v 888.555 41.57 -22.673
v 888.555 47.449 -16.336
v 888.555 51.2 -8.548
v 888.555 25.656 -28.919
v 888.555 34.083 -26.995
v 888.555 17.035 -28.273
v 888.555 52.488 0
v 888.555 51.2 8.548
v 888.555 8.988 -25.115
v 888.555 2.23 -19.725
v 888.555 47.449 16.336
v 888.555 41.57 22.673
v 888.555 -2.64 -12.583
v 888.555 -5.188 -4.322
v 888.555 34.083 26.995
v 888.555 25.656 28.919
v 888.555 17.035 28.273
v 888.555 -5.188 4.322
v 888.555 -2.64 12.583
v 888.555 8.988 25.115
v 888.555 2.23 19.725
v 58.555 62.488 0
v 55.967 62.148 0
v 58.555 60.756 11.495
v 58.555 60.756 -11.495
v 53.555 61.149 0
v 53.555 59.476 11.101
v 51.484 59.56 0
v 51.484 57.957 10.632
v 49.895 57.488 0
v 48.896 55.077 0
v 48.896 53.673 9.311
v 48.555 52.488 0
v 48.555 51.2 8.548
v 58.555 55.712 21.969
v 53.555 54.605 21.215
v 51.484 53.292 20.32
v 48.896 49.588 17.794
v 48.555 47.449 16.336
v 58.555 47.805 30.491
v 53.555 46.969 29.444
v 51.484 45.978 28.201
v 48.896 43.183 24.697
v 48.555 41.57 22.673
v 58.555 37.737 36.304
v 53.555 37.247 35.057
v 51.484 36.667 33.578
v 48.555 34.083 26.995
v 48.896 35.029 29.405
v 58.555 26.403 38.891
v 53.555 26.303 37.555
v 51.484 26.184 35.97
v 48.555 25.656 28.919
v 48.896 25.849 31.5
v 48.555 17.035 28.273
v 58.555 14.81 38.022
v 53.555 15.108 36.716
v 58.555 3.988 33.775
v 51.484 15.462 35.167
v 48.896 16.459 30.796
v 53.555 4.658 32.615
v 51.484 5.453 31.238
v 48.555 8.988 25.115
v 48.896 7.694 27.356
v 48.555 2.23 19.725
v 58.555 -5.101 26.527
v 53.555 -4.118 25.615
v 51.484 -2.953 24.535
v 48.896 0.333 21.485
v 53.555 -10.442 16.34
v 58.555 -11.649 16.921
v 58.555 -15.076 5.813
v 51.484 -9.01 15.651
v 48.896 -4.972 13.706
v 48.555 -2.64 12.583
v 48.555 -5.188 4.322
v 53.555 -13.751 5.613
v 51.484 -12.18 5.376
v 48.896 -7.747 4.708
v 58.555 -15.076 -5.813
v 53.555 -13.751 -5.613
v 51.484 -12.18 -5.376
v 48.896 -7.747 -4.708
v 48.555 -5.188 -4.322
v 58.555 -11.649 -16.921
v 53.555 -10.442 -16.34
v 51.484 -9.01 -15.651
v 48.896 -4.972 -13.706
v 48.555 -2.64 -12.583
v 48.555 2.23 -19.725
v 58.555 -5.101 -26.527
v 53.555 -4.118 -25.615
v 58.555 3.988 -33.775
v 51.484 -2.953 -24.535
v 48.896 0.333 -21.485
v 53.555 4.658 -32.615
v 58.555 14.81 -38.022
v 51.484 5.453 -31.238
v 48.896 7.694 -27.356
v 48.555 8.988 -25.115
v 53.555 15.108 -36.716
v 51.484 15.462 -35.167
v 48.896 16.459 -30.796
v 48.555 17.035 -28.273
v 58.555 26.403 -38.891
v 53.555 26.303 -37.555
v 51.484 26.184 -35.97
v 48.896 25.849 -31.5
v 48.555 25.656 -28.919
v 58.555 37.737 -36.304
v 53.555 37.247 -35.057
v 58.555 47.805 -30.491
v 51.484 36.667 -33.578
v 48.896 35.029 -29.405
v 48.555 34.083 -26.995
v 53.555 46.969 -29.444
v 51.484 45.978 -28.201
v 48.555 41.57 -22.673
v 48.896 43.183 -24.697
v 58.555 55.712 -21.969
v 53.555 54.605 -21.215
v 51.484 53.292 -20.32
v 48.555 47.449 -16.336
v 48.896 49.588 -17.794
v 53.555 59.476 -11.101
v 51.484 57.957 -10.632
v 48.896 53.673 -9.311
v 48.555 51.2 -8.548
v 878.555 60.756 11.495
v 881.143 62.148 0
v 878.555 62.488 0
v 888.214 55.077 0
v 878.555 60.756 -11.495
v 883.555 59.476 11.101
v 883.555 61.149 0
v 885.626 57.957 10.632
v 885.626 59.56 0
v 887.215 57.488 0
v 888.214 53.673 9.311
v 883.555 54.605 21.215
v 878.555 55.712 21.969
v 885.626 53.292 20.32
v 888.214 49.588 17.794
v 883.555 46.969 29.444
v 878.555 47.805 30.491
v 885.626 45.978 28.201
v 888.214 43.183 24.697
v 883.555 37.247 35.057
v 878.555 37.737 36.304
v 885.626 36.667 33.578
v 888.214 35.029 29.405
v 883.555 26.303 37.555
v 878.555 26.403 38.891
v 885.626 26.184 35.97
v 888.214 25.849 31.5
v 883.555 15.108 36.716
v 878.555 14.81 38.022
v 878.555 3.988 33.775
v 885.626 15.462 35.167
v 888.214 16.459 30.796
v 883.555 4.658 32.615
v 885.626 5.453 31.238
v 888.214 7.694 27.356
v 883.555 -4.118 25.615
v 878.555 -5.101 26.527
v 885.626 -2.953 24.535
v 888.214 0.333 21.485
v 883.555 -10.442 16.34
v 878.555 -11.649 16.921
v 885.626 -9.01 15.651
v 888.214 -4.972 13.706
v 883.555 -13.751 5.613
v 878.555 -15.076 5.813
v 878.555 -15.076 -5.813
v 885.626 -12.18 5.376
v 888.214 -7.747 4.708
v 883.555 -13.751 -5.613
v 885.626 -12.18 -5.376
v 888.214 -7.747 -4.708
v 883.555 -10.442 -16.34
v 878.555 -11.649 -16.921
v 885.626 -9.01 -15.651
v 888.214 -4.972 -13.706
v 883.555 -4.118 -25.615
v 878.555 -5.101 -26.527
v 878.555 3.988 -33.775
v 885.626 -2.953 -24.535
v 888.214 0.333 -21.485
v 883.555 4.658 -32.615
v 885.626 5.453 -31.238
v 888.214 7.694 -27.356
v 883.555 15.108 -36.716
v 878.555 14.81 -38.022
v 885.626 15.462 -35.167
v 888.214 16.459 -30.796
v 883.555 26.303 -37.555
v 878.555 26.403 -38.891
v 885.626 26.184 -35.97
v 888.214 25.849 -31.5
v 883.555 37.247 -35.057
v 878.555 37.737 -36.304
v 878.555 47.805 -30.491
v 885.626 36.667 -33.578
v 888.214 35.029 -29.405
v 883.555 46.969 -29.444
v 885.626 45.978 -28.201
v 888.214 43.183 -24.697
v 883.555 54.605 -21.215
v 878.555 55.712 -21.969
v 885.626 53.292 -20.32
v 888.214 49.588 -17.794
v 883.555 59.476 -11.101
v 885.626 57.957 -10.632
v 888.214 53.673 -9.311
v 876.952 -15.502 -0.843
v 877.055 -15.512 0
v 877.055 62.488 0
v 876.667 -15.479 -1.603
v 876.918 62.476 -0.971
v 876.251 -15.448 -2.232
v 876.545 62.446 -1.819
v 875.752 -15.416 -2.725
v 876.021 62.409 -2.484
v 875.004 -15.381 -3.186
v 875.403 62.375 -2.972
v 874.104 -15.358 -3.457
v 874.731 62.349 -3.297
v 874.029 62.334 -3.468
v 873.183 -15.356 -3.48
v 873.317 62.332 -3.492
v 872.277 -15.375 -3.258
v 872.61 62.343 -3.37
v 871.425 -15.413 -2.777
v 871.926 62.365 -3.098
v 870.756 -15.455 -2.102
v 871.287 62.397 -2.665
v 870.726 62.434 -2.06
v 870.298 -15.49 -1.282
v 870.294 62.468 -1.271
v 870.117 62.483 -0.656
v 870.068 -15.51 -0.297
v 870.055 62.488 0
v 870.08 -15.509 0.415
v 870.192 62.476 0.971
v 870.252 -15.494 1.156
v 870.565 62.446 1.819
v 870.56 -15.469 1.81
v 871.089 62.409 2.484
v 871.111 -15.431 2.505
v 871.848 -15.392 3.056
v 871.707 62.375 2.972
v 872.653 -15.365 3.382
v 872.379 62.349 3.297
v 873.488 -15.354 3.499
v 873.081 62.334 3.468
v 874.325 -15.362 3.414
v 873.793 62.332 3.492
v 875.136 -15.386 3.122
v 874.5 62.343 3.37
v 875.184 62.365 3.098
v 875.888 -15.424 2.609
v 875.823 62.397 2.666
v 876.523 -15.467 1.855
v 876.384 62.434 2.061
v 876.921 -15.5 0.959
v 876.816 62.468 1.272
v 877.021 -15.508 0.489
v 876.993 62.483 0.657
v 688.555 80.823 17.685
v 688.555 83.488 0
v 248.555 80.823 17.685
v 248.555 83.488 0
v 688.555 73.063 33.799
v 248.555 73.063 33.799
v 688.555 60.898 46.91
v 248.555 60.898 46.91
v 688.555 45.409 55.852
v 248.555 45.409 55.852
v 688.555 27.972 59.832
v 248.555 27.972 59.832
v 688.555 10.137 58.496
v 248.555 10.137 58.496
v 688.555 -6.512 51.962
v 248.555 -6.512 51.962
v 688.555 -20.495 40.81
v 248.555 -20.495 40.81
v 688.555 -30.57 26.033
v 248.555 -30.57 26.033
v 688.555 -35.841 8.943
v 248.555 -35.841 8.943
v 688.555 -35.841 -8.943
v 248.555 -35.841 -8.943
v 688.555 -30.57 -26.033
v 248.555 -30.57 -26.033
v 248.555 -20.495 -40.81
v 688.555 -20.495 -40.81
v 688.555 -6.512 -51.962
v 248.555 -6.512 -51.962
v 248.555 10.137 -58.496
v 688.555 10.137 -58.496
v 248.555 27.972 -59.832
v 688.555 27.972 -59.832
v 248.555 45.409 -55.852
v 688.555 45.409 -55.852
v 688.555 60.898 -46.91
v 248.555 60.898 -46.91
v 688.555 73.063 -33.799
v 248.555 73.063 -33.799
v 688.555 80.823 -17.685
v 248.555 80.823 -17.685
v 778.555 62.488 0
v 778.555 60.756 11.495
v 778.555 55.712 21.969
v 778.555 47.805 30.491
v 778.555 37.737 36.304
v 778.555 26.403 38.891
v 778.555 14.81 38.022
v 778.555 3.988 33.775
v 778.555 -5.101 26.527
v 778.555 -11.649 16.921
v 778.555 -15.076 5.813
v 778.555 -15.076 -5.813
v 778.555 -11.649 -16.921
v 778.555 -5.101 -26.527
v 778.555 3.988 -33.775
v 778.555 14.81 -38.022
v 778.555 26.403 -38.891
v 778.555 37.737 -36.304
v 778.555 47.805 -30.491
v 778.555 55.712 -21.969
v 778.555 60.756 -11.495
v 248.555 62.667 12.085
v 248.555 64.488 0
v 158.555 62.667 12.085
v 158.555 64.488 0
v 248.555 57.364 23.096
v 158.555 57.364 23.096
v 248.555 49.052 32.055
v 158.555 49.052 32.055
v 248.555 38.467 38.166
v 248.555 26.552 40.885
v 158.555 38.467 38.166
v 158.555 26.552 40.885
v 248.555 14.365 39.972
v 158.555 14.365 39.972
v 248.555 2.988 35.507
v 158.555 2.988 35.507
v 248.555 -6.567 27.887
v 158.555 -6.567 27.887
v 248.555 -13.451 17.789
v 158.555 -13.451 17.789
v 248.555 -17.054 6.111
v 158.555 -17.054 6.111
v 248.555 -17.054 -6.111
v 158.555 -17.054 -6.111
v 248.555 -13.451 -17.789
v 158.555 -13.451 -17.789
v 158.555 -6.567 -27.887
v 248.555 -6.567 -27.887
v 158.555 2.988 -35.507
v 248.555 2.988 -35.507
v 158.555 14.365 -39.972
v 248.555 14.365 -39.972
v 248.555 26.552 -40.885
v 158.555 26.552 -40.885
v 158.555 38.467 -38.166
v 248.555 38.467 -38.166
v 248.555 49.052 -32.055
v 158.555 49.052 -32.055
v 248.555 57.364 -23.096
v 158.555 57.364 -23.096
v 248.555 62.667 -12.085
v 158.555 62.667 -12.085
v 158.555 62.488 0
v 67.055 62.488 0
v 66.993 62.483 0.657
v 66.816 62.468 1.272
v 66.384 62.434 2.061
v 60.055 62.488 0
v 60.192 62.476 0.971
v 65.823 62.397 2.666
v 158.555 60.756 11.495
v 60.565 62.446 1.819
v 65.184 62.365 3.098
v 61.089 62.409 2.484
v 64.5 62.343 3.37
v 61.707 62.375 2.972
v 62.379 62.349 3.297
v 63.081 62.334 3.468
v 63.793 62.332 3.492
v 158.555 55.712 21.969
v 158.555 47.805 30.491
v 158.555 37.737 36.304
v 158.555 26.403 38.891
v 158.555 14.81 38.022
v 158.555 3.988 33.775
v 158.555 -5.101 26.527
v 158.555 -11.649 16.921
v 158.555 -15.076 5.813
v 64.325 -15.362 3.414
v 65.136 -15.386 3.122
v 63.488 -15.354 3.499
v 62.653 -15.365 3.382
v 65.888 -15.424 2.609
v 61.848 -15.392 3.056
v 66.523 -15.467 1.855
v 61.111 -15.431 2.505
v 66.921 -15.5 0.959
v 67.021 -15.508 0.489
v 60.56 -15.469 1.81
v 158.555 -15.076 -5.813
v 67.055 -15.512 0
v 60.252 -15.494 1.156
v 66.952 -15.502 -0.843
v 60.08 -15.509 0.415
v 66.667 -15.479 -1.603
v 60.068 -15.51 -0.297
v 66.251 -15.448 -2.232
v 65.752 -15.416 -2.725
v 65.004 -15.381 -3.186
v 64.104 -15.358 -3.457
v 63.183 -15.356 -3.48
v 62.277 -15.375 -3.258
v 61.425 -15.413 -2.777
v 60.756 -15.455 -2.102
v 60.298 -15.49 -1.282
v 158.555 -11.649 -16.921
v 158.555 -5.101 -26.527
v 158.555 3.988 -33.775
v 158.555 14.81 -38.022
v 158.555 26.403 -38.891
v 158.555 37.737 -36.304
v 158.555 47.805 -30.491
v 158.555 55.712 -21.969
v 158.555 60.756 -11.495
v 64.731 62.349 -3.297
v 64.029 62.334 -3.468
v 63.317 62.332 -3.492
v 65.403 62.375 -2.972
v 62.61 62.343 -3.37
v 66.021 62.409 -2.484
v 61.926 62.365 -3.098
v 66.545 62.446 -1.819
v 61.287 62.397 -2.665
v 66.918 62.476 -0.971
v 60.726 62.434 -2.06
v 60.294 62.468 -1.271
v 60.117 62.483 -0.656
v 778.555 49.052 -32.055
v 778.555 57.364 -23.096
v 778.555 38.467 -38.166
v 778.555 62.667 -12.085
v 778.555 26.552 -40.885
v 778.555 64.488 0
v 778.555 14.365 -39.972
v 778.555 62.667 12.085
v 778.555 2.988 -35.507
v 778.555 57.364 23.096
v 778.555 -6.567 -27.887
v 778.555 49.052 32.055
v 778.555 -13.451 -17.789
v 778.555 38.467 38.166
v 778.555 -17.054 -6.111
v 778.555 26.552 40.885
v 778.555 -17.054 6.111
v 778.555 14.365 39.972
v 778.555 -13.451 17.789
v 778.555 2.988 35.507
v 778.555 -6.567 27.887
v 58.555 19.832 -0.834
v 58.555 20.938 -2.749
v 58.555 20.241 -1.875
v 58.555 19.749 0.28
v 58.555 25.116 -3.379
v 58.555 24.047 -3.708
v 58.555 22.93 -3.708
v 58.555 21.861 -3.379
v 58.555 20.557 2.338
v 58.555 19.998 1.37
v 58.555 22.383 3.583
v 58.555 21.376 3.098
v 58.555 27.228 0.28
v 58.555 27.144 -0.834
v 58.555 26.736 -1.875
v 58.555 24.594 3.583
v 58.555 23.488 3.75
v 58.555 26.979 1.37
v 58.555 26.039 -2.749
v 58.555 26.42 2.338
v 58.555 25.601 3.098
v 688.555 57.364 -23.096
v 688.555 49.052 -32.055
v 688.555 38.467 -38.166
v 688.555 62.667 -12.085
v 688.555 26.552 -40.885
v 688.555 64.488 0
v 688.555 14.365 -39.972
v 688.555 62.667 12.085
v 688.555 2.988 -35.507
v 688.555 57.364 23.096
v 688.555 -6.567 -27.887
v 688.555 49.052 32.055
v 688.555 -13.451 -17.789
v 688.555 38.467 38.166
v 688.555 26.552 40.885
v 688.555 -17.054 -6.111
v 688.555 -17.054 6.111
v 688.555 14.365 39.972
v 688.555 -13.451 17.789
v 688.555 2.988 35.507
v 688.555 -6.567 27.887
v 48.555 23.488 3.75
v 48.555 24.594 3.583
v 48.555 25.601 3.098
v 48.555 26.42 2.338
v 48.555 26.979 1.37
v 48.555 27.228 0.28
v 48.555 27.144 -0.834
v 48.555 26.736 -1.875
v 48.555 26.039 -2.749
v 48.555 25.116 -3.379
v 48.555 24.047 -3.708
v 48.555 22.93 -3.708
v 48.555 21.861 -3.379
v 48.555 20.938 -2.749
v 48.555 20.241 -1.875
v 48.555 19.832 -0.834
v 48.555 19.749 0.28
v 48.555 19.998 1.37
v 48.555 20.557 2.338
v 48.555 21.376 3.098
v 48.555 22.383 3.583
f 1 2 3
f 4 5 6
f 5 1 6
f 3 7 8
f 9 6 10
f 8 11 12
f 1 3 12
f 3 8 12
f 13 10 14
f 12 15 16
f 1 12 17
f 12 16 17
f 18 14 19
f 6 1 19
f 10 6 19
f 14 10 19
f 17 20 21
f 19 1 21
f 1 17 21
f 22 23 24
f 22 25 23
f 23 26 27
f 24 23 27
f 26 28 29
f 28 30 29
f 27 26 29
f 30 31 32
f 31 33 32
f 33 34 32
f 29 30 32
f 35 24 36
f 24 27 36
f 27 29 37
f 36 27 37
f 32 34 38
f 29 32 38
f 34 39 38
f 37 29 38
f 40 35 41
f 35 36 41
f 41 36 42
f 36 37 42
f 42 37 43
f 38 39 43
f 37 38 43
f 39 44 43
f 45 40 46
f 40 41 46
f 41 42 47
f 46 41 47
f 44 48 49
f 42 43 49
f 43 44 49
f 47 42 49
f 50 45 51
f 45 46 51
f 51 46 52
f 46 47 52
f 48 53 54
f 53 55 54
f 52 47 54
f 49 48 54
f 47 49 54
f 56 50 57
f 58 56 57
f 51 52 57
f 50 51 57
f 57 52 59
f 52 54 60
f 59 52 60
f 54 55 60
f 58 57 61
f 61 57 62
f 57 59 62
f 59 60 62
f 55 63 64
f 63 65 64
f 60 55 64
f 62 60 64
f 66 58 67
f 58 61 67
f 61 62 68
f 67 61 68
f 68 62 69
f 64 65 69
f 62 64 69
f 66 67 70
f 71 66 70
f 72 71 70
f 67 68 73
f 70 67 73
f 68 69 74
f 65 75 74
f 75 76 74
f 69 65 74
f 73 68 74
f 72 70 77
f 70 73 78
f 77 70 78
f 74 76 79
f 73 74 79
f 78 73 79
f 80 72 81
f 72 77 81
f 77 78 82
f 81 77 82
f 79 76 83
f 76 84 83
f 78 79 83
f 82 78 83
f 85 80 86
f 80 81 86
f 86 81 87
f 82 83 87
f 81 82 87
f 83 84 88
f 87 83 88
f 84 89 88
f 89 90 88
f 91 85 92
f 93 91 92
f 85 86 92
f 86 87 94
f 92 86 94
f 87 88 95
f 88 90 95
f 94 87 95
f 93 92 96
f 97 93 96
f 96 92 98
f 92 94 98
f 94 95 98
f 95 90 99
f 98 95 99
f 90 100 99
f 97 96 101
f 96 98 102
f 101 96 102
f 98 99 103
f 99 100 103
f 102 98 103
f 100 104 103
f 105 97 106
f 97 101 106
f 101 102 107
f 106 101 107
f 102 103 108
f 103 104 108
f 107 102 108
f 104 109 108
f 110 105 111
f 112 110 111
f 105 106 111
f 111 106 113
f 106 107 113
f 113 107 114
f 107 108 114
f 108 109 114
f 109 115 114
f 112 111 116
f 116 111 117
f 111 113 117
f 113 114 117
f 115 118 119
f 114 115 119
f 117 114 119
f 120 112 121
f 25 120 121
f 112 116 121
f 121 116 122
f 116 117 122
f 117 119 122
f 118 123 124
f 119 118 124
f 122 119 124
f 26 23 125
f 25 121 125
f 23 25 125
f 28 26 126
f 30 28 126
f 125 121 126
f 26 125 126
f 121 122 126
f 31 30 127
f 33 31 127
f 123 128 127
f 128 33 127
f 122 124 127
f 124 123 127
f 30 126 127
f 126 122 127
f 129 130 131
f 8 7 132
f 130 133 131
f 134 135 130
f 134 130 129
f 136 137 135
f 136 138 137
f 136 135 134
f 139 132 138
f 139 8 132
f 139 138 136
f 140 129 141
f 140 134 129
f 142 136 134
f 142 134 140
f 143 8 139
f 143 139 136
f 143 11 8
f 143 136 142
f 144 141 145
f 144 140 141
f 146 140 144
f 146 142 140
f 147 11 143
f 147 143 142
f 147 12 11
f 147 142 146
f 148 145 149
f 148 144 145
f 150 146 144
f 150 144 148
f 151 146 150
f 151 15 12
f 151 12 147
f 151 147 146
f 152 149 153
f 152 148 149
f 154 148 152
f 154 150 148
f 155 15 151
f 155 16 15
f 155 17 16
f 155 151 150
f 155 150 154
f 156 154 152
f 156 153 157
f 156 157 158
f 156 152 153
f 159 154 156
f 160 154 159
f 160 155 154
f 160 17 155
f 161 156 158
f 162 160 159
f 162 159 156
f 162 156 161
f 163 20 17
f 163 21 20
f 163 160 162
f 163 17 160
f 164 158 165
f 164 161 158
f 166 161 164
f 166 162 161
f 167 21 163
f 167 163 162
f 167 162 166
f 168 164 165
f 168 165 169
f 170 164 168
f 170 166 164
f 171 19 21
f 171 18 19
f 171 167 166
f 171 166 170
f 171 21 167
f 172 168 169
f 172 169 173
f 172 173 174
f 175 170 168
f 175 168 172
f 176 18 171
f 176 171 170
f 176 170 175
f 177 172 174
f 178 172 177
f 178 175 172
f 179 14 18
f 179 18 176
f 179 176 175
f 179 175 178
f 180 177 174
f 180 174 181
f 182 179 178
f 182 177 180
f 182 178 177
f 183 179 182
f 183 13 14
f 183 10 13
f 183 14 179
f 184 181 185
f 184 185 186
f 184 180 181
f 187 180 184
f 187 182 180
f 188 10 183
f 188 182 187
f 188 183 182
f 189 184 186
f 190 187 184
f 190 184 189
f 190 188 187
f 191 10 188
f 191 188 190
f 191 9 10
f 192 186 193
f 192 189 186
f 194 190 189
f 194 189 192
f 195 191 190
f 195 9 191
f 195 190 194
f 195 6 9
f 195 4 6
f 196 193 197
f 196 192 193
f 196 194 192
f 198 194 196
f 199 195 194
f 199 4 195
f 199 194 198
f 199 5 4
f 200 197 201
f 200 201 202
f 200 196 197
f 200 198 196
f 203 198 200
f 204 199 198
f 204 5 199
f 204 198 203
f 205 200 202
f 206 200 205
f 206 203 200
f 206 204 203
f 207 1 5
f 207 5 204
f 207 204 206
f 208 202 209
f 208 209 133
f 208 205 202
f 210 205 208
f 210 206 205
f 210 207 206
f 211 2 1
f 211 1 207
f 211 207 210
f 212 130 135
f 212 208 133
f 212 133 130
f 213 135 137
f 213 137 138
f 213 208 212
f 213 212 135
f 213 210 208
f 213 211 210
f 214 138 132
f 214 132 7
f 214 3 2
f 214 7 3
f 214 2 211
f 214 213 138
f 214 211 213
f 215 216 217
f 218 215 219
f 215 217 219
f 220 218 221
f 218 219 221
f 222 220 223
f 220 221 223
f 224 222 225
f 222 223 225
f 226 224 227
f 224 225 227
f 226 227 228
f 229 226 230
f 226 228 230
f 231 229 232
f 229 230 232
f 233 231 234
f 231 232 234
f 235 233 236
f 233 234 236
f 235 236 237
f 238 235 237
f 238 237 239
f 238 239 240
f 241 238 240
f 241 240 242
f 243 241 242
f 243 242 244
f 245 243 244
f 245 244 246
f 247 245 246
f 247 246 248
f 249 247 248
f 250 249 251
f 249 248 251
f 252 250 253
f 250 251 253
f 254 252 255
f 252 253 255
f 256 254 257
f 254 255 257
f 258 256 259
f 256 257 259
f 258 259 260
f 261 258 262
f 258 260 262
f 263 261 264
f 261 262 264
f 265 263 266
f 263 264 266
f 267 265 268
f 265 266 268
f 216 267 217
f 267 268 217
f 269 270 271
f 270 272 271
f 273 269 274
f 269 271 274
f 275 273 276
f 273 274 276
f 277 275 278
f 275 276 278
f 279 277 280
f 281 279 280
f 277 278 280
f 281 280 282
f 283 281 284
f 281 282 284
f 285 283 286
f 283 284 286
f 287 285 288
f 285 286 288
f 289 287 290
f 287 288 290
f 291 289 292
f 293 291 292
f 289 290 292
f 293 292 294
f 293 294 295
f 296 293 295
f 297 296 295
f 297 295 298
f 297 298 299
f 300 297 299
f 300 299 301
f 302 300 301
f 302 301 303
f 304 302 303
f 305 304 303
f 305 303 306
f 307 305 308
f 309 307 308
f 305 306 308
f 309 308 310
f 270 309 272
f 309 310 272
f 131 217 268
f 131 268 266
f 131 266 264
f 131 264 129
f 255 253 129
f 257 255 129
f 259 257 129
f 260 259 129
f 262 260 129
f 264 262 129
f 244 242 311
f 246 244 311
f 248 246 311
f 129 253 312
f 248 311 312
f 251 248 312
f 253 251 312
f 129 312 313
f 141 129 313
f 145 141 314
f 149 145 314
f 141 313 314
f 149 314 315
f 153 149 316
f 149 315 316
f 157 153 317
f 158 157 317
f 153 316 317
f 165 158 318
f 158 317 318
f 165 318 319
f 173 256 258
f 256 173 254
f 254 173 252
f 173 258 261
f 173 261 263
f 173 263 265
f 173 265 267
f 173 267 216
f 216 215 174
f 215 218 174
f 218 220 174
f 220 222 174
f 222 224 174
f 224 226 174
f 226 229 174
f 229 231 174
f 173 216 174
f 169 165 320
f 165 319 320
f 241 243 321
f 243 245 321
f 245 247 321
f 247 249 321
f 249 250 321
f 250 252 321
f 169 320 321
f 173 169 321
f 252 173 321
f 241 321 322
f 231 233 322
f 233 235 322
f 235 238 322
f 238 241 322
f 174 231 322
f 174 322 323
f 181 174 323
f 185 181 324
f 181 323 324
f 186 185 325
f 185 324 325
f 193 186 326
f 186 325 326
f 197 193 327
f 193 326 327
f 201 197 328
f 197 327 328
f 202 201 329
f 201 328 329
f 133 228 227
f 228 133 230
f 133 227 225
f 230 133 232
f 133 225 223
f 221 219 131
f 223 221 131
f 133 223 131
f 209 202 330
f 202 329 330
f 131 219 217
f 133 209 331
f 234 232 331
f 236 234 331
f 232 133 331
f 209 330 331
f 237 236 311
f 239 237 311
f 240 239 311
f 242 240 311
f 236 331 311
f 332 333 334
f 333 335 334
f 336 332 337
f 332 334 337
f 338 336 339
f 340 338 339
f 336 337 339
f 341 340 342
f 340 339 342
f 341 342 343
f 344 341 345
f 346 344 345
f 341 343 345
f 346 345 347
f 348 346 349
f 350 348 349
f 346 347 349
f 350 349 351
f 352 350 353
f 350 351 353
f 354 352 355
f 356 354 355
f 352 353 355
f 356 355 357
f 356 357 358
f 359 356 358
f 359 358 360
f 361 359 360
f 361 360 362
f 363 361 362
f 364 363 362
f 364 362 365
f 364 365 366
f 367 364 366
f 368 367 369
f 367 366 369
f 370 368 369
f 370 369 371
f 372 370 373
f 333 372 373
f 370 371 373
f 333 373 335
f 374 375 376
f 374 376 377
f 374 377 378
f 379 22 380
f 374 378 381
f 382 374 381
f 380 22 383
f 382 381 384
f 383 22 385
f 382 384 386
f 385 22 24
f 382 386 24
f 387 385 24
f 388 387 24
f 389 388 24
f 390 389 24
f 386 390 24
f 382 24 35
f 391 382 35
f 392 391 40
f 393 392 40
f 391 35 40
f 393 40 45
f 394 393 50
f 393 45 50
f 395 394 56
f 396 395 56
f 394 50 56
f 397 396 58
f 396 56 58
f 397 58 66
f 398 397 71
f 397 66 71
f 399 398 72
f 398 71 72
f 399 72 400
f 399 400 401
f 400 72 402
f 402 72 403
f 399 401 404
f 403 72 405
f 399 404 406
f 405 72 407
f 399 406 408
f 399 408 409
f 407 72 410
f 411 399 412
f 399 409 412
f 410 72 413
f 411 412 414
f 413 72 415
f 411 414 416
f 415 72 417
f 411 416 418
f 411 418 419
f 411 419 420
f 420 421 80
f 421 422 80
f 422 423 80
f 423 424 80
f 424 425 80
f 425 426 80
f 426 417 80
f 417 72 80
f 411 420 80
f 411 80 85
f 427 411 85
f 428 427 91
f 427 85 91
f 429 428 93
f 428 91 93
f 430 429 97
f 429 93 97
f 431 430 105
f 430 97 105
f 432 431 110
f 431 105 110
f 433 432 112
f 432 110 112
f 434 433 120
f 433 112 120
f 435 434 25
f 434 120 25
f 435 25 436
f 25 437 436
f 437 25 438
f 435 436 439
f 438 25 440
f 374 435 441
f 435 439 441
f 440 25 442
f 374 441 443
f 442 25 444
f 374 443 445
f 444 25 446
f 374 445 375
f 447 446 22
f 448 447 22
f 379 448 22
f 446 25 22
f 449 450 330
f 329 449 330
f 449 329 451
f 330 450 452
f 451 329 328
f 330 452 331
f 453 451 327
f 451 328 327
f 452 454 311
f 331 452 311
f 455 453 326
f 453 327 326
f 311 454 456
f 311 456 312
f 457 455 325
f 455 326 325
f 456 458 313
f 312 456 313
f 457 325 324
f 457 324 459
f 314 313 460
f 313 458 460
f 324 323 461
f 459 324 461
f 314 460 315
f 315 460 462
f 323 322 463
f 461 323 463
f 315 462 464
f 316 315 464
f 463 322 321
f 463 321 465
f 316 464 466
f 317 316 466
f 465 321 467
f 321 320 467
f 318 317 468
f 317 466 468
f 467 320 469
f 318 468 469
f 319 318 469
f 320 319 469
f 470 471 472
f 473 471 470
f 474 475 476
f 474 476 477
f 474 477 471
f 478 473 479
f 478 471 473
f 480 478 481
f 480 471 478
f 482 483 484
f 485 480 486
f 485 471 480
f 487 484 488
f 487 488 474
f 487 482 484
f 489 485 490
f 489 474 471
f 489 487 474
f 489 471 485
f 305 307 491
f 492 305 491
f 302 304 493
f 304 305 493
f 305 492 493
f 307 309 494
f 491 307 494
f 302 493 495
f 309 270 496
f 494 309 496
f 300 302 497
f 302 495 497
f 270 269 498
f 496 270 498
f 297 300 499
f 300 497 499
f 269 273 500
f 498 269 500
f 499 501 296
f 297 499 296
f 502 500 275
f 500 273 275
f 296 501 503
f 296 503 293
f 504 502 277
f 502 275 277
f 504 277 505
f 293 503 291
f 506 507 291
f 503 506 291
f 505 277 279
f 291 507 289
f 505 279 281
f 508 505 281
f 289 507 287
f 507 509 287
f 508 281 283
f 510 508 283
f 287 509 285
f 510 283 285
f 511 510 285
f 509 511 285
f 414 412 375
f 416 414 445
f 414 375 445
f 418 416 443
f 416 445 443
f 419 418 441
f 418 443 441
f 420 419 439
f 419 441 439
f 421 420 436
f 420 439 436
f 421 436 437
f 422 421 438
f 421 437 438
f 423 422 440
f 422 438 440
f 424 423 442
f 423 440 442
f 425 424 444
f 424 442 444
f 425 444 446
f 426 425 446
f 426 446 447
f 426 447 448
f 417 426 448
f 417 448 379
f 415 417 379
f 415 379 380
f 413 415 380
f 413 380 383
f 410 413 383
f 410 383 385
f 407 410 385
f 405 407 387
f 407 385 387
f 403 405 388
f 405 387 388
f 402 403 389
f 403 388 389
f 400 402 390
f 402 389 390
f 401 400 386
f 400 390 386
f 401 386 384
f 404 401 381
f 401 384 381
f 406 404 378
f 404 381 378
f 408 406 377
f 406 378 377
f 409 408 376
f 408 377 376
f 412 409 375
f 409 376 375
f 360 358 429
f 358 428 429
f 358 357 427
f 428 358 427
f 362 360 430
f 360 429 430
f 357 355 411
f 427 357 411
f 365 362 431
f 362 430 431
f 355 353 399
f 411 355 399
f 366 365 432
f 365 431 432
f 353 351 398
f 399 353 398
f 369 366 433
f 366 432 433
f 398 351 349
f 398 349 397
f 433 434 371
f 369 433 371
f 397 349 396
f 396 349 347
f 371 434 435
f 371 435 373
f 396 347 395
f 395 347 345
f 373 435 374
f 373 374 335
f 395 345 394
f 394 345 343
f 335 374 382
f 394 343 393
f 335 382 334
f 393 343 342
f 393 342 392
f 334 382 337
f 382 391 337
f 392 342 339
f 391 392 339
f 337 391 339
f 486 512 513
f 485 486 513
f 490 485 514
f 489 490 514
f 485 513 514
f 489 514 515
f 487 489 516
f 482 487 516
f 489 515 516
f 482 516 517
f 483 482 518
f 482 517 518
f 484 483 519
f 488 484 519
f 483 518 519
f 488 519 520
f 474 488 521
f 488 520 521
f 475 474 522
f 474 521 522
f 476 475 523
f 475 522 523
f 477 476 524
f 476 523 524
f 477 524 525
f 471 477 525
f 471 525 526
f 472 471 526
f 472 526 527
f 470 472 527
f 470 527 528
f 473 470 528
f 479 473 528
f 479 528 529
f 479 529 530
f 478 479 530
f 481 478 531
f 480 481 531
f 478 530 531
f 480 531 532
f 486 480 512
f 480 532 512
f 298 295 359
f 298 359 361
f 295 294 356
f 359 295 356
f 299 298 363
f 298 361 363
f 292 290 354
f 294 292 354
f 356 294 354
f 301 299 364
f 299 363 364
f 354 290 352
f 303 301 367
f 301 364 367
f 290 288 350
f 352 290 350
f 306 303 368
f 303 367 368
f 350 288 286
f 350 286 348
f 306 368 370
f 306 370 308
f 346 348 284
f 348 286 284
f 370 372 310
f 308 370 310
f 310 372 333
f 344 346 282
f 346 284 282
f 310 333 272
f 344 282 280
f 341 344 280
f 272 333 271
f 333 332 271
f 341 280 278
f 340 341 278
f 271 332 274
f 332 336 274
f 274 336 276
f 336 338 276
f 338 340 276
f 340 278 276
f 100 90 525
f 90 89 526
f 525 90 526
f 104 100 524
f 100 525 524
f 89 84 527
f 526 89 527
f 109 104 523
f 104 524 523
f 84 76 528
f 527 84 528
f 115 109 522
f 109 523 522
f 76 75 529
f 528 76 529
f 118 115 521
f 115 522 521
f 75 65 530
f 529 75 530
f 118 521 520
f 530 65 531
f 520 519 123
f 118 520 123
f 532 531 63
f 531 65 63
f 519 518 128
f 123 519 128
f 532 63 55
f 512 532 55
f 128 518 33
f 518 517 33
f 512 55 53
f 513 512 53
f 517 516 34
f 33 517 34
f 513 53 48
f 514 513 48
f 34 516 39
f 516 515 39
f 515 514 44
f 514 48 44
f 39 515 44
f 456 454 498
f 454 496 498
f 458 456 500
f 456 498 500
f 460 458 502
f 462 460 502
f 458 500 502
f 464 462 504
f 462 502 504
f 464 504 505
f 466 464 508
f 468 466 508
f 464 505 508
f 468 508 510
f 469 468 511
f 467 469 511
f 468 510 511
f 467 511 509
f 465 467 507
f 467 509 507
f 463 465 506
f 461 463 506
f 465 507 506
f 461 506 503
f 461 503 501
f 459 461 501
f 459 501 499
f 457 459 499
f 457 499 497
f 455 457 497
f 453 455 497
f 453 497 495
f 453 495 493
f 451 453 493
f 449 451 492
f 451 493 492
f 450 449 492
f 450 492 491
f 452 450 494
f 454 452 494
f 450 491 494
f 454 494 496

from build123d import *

# Parameters (mm, degrees)
RADYUS1_R             = 10
IZIM2_R               = 3.75
KES_EKSTR_ZYON1_DEPTH = 10
RADYUS2_R             = 10
IZIM3_R               = 3.5
KES_EKSTR_ZYON2_DEPTH = 100.511524539


with BuildPart() as part:
    # Çizim1 → Döndür1 (revolve)
    with BuildSketch(Plane.XY):
        Polygon((158.555065461, 64.488475461), (158.555065461, 62.488475461), (48.555065461, 62.488475461), (48.555065461, 23.488475461), (888.555065461, 23.488475461), (888.555065461, 62.488475461), (778.555065461, 62.488475461), (778.555065461, 64.488475461), (688.555065461, 64.488475461), (688.555065461, 83.488475461), (248.555065461, 83.488475461), (248.555065461, 64.488475461), align=None)
    revolve(axis=Axis((48.555065461, 23.488475461, 0), (1, 0, 0)))

    # Radyus1
    radyus1_edges = [part.edges().sort_by_distance(p)[0] for p in [
        (48.555065461, -15.511524539, 0),
    ]]
    fillet(radyus1_edges, radius=RADYUS1_R)

    # Çizim2 → Kes-Ekstrüzyon1 (cut)
    with BuildSketch(Plane.ZY.offset(-48.555065461)):
        with Locations((0, 23.488475461)):
            Circle(IZIM2_R)
    extrude(amount=-KES_EKSTR_ZYON1_DEPTH, mode=Mode.SUBTRACT)

    # Radyus2
    radyus2_edges = [part.edges().sort_by_distance(p)[0] for p in [
        (888.555065461, -15.511524539, 0),
    ]]
    fillet(radyus2_edges, radius=RADYUS2_R)

    # Çizim3 → Kes-Ekstrüzyon2 (cut, through all)
    with BuildSketch(Plane(origin=(0, 63, 0), x_dir=(1, 0, 0), z_dir=(0, 1, 0))):
        with Locations((63.555065461, 0)):
            Circle(IZIM3_R)
        with Locations((873.555065461, 0)):
            Circle(IZIM3_R)
    extrude(amount=-KES_EKSTR_ZYON2_DEPTH, mode=Mode.SUBTRACT)


solid = part.part
